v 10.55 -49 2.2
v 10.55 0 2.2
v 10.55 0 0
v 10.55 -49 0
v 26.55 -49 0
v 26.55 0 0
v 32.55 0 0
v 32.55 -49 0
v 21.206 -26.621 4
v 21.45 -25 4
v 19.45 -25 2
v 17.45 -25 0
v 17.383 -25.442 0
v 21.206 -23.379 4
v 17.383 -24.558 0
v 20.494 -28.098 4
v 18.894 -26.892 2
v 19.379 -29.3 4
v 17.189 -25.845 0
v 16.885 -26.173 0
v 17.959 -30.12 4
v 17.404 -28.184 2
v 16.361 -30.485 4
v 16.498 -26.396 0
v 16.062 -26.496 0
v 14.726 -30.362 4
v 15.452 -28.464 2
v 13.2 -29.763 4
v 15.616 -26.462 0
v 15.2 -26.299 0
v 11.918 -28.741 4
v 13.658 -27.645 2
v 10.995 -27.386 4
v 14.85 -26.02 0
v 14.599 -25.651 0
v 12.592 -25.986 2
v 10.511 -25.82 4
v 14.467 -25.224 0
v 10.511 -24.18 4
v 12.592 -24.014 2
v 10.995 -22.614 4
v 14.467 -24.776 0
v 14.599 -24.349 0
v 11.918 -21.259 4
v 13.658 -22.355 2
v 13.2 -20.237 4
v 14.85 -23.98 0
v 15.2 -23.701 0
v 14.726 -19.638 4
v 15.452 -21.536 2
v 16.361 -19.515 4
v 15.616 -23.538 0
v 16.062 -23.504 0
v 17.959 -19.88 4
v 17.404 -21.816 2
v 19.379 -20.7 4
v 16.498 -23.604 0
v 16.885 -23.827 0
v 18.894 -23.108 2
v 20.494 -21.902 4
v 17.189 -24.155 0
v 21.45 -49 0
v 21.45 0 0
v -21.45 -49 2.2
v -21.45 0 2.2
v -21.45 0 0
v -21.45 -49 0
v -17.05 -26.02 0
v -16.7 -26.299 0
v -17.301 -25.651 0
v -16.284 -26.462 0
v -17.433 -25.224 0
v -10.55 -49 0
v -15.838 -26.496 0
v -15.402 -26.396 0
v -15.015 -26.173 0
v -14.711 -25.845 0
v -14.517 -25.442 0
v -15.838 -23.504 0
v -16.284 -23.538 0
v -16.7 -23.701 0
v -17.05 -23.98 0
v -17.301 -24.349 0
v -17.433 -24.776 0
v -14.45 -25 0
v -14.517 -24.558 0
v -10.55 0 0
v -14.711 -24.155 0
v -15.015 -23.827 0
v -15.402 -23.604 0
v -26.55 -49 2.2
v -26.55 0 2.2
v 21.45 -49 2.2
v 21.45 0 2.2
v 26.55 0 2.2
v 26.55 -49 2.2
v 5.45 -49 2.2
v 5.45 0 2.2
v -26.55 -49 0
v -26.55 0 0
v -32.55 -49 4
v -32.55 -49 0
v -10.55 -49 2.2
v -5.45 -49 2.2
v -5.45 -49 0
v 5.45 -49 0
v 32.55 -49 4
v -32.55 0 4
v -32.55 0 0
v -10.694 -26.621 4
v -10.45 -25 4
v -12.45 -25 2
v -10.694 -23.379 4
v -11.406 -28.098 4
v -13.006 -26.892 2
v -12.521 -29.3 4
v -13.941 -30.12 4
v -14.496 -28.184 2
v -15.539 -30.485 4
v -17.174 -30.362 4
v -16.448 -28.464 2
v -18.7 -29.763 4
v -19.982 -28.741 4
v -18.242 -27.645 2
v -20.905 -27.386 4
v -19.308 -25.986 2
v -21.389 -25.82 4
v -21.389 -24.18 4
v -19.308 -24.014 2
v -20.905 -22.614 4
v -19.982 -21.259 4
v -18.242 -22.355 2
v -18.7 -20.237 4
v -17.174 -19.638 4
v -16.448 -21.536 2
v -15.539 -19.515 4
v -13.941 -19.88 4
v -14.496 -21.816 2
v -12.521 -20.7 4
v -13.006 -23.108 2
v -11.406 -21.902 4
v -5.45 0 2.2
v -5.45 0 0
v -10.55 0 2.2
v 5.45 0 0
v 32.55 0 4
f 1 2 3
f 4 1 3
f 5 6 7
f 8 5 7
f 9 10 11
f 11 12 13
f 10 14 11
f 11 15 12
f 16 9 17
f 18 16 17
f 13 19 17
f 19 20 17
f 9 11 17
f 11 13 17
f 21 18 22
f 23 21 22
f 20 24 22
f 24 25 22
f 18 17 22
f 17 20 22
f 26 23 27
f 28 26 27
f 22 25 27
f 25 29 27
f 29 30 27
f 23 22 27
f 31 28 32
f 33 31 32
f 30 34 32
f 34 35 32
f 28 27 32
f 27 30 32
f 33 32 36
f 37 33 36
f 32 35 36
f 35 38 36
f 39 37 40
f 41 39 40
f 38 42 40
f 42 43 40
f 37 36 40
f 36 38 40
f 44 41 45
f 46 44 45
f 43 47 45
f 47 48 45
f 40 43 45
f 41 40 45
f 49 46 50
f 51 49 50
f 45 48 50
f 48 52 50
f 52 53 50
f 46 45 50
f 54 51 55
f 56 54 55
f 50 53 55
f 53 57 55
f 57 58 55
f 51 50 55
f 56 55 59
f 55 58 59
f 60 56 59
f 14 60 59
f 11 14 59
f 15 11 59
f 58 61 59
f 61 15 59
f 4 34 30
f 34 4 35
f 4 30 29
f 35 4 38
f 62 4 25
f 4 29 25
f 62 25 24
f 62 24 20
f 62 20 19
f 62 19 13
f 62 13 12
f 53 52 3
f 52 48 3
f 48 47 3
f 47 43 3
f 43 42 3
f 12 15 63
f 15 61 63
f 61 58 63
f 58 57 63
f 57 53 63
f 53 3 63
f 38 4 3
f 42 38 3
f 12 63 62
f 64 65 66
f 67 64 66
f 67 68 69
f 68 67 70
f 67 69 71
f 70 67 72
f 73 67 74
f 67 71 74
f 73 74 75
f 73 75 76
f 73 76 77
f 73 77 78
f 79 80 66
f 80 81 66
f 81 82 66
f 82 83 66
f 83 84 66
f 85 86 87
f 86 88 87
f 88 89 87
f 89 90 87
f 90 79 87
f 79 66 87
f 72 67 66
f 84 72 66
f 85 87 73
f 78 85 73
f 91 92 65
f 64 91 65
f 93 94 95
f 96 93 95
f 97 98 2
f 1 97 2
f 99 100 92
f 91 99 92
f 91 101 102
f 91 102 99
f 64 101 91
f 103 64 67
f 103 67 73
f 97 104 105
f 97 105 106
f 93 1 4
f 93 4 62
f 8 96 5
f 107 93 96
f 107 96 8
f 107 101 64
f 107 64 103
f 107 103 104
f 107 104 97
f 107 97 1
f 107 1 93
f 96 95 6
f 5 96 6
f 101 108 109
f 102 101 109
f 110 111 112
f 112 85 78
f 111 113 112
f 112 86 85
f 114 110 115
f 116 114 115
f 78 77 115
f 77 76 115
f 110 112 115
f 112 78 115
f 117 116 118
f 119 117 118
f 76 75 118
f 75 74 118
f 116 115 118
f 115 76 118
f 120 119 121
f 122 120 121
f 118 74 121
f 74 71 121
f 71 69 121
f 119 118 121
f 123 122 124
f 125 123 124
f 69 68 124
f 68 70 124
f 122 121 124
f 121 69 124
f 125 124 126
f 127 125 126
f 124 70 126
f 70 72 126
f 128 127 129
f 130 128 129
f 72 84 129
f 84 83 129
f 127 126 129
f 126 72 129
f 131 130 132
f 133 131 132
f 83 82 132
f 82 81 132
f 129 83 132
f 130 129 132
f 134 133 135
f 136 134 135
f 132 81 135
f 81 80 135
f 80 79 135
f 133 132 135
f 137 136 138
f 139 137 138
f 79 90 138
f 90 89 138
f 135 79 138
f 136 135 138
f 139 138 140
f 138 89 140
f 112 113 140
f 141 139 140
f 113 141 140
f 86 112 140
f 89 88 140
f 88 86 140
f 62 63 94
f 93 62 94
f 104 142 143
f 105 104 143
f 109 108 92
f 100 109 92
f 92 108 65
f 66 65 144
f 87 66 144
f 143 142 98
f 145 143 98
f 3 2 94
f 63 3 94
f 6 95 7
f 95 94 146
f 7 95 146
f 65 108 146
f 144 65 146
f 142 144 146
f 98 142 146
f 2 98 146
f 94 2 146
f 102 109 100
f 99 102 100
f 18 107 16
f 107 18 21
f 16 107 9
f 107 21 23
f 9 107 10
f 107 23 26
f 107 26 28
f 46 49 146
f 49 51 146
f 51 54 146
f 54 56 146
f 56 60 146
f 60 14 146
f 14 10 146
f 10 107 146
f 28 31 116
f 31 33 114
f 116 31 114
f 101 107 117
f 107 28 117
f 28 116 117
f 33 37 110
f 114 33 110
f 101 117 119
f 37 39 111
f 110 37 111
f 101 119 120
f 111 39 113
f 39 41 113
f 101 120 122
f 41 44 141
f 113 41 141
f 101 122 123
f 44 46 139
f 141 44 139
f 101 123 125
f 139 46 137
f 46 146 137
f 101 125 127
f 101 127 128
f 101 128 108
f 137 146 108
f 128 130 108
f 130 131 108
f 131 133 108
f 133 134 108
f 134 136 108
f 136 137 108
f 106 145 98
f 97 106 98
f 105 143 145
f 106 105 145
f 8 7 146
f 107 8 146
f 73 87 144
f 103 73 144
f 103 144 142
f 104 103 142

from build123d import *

# Parameters (mm, degrees)
F1_DEPTH      = 49
F2_R          = 1.5
F3_DEPTH      = 25
F3_DEPTH_BACK = 25
F4_DEPTH      = 12.4
F5_SIZE       = 3.99999


# Not quite as in the source:
# - a fillet or chamfer is up to 0.001 mm smaller than in the source, because OpenCascade refuses the exact size
# - a feature names something its author has since deleted; it is built from what else it names


with BuildPart() as f1:
    # F0 (on Front) → F1 (new body)
    with BuildSketch(Plane.XZ):
        Polygon((-16.275, 4), (-32.55, 4), (-32.55, 0), (-26.55, 0), (-26.55, 2.2), (-21.45, 2.2), (-21.45, 0), (-16.275, 0), align=None)
        Polygon((0, 4), (-16.275, 4), (-16.275, 0), (-10.55, 0), (-10.55, 2.2), (-5.45, 2.2), (-5.45, 0), (0, 0), align=None)
        Polygon((16.275, 4), (0, 4), (0, 0), (5.45, 0), (5.45, 2.2), (10.55, 2.2), (10.55, 0), (16.275, 0), align=None)
        Polygon((32.55, 4), (16.275, 4), (16.275, 0), (21.45, 0), (21.45, 2.2), (26.55, 2.2), (26.55, 0), (32.55, 0), align=None)
    extrude(amount=F1_DEPTH)

    # F2 (on Top) → F3 (cut, two sides)
    with BuildSketch(Plane.XY) as f3_sk:
        with Locations((-15.95, -25)):
            Circle(F2_R)
    extrude(amount=-F3_DEPTH, mode=Mode.SUBTRACT)
    extrude(f3_sk.sketch, amount=F3_DEPTH_BACK, mode=Mode.SUBTRACT)

    # F2 (on Top) → F4 (cut)
    with BuildSketch(Plane.XY):
        with Locations((-15.95, -25)):
            Circle(F2_R)
        with Locations((15.95, -25)):
            Circle(F2_R)
    extrude(amount=F4_DEPTH, mode=Mode.SUBTRACT)

    # F5 (size 4 in the source; OpenCascade refuses exactly that, so slightly less here)
    f5_edges = [f1.edges().sort_by_distance(p)[0] for p in [
        (14.45, -25, 4),
        (-17.45, -25, 4),
    ]]
    chamfer(f5_edges, length=F5_SIZE)


solid = f1.part
